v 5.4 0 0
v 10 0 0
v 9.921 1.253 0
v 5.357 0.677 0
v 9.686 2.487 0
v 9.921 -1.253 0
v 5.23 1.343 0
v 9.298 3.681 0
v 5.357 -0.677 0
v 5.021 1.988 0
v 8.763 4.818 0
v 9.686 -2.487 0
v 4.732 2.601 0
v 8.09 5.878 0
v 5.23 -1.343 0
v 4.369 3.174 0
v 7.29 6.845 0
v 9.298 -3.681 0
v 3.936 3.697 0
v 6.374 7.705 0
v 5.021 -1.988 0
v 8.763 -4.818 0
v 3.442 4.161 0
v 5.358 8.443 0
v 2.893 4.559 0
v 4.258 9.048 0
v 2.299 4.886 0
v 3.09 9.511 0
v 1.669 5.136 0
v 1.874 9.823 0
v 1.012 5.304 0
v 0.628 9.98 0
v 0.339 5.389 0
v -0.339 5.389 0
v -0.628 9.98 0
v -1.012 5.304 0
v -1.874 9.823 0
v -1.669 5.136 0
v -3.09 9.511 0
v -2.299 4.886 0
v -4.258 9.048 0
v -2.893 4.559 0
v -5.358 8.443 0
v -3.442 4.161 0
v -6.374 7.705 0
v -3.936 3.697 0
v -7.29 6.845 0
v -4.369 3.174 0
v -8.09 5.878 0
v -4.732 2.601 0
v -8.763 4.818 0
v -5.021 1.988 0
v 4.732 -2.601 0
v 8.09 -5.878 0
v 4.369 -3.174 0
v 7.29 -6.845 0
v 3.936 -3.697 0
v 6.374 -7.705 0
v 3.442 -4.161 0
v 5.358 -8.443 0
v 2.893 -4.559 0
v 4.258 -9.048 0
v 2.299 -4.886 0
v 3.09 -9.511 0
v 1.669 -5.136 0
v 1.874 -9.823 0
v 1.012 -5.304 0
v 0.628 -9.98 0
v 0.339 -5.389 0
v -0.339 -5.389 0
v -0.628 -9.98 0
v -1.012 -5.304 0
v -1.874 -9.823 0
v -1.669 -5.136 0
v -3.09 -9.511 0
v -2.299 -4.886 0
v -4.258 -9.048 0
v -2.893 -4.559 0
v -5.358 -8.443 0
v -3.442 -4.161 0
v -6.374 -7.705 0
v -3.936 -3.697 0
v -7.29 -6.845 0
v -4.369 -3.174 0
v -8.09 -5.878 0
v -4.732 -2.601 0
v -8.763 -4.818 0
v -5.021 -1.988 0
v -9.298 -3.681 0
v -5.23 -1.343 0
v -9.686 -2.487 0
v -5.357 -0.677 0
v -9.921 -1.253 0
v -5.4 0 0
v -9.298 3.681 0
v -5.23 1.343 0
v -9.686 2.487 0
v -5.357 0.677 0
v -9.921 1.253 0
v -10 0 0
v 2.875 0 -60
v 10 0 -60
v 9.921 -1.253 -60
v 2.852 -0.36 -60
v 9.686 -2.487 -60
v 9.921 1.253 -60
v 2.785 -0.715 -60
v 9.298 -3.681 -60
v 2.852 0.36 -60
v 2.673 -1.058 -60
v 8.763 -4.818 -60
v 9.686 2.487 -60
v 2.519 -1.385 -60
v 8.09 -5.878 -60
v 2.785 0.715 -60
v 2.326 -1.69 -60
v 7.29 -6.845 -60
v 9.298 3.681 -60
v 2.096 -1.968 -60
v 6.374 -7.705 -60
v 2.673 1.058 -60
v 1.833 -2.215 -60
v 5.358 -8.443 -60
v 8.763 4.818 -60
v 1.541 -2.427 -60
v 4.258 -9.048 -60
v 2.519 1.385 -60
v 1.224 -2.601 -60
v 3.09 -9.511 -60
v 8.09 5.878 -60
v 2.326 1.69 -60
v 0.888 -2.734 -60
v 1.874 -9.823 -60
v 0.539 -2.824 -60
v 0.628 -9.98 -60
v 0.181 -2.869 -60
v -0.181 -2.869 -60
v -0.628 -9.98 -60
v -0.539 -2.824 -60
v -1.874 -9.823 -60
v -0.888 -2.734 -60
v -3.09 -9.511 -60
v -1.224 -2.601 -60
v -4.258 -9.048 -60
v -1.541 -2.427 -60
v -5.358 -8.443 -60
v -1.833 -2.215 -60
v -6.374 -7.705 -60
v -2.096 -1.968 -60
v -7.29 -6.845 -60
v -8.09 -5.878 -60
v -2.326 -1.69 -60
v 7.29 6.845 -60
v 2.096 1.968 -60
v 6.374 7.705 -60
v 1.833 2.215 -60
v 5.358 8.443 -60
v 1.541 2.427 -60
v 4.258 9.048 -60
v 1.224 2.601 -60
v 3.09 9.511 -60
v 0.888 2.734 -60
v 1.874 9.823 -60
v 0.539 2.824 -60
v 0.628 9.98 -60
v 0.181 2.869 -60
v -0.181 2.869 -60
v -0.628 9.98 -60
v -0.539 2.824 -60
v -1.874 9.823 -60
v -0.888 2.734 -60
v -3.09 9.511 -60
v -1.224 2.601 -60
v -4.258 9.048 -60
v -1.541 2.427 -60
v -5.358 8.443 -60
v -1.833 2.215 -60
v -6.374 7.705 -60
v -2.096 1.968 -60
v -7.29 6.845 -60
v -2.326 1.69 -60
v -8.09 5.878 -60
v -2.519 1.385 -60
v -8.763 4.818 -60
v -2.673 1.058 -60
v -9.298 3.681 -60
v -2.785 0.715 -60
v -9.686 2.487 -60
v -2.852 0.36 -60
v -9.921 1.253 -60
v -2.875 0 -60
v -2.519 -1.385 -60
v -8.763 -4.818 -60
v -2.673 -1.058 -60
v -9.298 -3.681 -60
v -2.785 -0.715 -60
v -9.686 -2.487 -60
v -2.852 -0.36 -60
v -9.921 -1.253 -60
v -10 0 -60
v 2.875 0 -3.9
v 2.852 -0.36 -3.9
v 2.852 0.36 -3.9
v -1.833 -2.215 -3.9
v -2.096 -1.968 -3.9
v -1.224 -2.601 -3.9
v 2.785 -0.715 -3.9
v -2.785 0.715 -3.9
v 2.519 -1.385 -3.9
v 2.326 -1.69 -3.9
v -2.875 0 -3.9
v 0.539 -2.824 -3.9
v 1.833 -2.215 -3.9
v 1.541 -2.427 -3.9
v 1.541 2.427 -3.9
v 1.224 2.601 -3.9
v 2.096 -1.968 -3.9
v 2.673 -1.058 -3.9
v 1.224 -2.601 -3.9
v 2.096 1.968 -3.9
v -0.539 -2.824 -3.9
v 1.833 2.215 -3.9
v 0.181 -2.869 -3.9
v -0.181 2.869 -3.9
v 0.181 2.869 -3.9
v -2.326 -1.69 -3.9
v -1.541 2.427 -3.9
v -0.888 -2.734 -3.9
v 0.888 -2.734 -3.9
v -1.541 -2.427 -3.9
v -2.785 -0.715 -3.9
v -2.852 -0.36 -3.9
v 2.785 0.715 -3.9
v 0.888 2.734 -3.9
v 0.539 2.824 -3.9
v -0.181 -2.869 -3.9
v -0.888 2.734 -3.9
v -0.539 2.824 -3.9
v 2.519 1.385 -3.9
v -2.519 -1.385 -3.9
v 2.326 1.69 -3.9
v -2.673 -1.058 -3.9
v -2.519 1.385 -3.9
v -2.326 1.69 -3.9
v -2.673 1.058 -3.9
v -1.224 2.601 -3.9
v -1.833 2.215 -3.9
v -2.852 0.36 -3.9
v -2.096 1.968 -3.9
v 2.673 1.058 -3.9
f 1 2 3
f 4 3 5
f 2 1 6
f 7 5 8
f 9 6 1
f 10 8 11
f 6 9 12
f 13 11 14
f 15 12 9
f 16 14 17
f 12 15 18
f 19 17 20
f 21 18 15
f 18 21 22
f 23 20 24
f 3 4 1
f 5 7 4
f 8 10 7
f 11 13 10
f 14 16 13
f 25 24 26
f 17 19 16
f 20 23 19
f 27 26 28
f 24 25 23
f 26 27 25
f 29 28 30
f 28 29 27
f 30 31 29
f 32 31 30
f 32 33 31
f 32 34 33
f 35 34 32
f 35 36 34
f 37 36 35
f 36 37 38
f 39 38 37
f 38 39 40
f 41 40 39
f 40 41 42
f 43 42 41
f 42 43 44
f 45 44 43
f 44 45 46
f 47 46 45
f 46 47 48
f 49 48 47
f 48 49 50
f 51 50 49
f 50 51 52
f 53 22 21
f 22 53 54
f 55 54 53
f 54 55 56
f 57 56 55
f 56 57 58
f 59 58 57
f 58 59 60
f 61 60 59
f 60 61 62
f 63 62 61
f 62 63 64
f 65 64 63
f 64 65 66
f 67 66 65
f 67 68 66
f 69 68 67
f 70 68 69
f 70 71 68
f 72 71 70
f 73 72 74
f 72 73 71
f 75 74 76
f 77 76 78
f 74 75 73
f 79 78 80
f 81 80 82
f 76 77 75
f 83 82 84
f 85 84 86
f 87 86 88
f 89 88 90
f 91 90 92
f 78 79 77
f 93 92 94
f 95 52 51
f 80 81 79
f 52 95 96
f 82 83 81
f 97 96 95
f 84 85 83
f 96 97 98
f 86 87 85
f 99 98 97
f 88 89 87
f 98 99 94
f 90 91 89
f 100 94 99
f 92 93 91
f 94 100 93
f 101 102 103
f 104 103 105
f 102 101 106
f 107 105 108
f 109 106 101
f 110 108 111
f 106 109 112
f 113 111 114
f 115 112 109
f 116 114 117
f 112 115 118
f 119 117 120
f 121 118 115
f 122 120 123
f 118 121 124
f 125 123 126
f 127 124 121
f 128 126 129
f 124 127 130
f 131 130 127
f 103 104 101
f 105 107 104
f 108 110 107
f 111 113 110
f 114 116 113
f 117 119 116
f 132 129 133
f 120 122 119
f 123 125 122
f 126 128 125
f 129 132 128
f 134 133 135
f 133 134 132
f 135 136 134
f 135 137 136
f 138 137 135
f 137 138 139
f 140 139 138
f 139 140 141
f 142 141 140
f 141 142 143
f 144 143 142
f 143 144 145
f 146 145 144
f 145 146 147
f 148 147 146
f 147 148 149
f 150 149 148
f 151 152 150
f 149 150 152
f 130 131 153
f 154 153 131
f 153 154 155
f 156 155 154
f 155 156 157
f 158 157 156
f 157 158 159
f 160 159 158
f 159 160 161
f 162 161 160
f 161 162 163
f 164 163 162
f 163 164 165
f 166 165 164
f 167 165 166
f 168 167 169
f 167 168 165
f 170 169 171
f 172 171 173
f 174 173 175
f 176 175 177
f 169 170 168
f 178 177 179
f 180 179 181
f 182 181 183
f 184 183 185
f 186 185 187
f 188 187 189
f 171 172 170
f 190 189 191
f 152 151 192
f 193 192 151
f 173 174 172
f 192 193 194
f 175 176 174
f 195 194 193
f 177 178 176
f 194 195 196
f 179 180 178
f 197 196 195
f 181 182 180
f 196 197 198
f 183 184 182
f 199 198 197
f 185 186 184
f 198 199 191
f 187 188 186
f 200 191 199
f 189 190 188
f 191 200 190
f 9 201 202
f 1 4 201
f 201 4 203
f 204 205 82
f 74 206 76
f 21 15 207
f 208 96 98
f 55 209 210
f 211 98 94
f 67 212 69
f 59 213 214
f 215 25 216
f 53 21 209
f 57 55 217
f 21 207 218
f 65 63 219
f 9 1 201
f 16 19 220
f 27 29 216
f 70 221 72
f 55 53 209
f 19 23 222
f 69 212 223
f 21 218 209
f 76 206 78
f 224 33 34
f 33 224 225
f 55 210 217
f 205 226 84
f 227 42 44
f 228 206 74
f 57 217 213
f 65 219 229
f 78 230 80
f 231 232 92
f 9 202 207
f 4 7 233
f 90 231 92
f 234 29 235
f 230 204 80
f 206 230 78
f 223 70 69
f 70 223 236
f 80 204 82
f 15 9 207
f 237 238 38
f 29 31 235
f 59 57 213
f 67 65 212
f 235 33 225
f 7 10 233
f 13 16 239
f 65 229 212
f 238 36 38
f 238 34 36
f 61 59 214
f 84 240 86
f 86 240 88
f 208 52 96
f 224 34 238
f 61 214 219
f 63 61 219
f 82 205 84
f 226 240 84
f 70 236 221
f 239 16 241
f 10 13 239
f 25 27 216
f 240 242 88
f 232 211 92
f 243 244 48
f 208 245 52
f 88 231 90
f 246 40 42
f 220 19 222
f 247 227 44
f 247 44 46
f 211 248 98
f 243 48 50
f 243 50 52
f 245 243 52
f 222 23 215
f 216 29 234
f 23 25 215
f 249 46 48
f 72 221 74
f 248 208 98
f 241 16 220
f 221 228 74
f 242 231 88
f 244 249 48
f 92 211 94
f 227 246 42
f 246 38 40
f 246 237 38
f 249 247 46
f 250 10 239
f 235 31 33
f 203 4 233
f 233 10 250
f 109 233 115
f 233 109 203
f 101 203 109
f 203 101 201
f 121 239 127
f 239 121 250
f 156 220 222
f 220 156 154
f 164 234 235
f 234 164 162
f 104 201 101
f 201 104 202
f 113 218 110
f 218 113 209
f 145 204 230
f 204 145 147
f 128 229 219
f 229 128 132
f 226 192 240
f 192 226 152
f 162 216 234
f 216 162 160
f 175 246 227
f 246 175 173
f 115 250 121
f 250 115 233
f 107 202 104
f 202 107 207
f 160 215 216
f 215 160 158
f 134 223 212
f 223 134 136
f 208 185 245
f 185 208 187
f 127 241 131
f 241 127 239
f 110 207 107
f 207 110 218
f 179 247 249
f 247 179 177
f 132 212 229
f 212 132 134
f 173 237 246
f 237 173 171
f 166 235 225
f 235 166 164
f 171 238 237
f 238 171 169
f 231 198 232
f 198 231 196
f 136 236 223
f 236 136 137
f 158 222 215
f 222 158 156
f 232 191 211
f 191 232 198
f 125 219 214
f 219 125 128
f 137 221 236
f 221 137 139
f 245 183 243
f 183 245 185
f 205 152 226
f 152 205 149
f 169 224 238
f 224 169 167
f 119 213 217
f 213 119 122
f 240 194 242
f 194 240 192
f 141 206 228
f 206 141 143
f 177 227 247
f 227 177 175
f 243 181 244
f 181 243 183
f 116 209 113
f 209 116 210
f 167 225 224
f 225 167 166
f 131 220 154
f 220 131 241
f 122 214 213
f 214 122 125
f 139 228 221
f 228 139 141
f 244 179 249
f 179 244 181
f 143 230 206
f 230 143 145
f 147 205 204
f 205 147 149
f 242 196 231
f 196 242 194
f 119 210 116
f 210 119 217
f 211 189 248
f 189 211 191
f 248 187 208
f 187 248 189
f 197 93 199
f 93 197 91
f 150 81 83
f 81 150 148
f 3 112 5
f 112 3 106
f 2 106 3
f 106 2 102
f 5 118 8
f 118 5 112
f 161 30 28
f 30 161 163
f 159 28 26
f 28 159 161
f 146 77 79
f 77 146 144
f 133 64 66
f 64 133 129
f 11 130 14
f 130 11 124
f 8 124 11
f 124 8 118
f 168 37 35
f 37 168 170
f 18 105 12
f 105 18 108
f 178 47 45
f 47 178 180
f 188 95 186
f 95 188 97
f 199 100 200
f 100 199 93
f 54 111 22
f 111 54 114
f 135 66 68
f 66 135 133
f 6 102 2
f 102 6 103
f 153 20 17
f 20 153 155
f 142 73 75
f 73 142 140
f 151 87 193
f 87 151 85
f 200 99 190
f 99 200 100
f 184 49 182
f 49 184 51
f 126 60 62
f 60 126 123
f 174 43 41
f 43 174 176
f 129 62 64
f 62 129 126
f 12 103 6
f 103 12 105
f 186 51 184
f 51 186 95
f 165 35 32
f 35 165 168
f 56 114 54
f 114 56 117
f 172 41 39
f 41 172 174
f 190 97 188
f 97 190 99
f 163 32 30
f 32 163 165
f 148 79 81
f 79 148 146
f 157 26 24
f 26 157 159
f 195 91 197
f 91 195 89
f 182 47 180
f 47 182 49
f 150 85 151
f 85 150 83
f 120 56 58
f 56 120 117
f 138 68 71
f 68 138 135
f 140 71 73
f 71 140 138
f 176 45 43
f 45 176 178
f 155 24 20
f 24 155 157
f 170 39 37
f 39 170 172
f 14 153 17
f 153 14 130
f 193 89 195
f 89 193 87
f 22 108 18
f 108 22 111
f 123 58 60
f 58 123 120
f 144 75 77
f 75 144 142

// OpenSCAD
$fn = 50;


difference() {
	union() {
		translate(v = [0, 0, -60.0000000000]) {
			cylinder(h = 60, r = 10.0000000000);
		}
		cylinder(h = 0, r = 13.0000000000);
	}
	union() {
		translate(v = [0, 0, 0]) {
			rotate(a = [0, 0, 0]) {
				difference() {
					union() {
						#translate(v = [0, 0, -60.0000000000]) {
							cylinder(h = 60, r = 2.6000000000);
						}
						#translate(v = [0, 0, -3.9000000000]) {
							cylinder(h = 3.9000000000, r1 = 2.8750000000, r2 = 5.4000000000);
						}
						#translate(v = [0, 0, -60.0000000000]) {
							cylinder(h = 60, r = 2.8750000000);
						}
						#translate(v = [0, 0, -60.0000000000]) {
							cylinder(h = 60, r = 2.6000000000);
						}
					}
					union();
				}
			}
		}
	}
}
